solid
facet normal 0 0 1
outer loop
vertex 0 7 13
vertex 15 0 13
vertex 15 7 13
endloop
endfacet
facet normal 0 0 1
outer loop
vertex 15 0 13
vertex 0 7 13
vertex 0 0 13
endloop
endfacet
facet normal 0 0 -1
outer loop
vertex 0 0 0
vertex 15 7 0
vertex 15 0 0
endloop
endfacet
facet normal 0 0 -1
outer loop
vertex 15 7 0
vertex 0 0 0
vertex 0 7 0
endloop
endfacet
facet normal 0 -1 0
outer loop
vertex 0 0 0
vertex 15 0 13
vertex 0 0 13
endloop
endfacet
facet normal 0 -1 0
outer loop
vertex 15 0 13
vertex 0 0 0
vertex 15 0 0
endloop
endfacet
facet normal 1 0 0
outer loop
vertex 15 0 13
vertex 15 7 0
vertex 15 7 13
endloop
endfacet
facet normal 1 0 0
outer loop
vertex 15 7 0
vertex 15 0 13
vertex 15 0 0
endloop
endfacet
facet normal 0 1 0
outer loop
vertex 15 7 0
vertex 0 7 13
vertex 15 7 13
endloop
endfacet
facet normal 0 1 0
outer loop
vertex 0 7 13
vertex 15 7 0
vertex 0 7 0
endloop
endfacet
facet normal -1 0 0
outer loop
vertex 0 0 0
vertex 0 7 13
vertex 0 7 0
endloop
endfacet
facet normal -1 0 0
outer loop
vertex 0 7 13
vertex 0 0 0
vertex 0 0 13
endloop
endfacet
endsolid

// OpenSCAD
// Generated by SolidPython 1.0.1 on 2020-07-29 00:46:55


cube(size = [15, 7, 13]);
/***********************************************
*********      SolidPython code:      **********
************************************************
 
# import packages: SolidPython
from solid import *
from solid.utils import *
from itertools import chain, combinations, permutations


class Resize:

    def __init__(self, scad_file):
        self.scad_file = scad_file
        #self.scad_file = import_scad(scad_file)
        # cone/cylinder param:
        self.r1 = 0
        self.r2 = 0
        self.h = 0
        # rectangular prism param:
        self.w = 0
        self.l = 0
        # ellipse param:
        self.r = 0

    # import OpenScad code (file name corresponds to shape)


    # classify shape + parameters
    def assign(self, param1, param2, param3):
        if self.scad_file == 'cone.scad':
            self.r1 = param1
            self.r2 = param2
            self.h = param3
        elif self.scad_file == 'cylinder.scad':
            self.r1 = param1
            self.r2 = param2
            self.h = param3
        elif self.scad_file == 'rectangularPrism.scad':
            self.h = param1
            self.l = param2
            self.w = param3
        else:
            self.r = param1
            self.h = param2

    # resize parameters
    def iterate(self):
        x = range(3, 20, 2)
        i = 1
        if self.scad_file == 'cone.scad':
            tempList = list(permutations(x, 2))
            for temp in tempList:
                param1 = temp[0]
                param2 = temp[1]
                filepath = 'produced_scad_files/' + 'cone' + str(param1) + '_' + str(param2) + '_' + '.scad'
                scad_render_to_file(cylinder(h=param1, r1=param2, r2=0), filepath)

        elif self.scad_file == 'cylinder.scad':
            tempList = list(permutations(x, 3))
            for temp in tempList:
                param1 = temp[0]
                param2 = temp[1]
                filepath = 'produced_scad_files/' + 'cylinder' + str(param1) + '_' + str(param2) + '_' + '.scad'
                scad_render_to_file(cylinder(h=param1, r1=param2, r2=param2), filepath)

        elif self.scad_file == 'rectangularPrism.scad':
            tempList = list(permutations(x, 3))
            for temp in tempList:
                param1 = temp[0]
                param2 = temp[1]
                param3 = temp[2]
                filepath = 'produced_scad_files/' + 'rectangularPrism' + str(param1) + '_' + str(param2) + '_' + str(
                    param3) + '.scad'
                scad_render_to_file(cube(size=(param1, param2, param3)), filepath)

        elif self.scad_file == 'ellipse.scad':
            tempList = list(permutations(x, 4))
            for temp in tempList:
                param1 = temp[0]
                param2 = temp[1]
                param3 = temp[2]
                param4 = temp[3]
                filepath = 'produced_scad_files/' + 'ellipse' + str(param1) + '_' + str(param2) + '_' + str(param3) + '_' + str(param4) + '.scad'
                scad_render_to_file(scale([param1, param2, param3])(sphere(r=param4)), filepath)

    def render_to_scadfile(self):
        scad_render_to_file(scad, 'example.scad') 
 
************************************************/
